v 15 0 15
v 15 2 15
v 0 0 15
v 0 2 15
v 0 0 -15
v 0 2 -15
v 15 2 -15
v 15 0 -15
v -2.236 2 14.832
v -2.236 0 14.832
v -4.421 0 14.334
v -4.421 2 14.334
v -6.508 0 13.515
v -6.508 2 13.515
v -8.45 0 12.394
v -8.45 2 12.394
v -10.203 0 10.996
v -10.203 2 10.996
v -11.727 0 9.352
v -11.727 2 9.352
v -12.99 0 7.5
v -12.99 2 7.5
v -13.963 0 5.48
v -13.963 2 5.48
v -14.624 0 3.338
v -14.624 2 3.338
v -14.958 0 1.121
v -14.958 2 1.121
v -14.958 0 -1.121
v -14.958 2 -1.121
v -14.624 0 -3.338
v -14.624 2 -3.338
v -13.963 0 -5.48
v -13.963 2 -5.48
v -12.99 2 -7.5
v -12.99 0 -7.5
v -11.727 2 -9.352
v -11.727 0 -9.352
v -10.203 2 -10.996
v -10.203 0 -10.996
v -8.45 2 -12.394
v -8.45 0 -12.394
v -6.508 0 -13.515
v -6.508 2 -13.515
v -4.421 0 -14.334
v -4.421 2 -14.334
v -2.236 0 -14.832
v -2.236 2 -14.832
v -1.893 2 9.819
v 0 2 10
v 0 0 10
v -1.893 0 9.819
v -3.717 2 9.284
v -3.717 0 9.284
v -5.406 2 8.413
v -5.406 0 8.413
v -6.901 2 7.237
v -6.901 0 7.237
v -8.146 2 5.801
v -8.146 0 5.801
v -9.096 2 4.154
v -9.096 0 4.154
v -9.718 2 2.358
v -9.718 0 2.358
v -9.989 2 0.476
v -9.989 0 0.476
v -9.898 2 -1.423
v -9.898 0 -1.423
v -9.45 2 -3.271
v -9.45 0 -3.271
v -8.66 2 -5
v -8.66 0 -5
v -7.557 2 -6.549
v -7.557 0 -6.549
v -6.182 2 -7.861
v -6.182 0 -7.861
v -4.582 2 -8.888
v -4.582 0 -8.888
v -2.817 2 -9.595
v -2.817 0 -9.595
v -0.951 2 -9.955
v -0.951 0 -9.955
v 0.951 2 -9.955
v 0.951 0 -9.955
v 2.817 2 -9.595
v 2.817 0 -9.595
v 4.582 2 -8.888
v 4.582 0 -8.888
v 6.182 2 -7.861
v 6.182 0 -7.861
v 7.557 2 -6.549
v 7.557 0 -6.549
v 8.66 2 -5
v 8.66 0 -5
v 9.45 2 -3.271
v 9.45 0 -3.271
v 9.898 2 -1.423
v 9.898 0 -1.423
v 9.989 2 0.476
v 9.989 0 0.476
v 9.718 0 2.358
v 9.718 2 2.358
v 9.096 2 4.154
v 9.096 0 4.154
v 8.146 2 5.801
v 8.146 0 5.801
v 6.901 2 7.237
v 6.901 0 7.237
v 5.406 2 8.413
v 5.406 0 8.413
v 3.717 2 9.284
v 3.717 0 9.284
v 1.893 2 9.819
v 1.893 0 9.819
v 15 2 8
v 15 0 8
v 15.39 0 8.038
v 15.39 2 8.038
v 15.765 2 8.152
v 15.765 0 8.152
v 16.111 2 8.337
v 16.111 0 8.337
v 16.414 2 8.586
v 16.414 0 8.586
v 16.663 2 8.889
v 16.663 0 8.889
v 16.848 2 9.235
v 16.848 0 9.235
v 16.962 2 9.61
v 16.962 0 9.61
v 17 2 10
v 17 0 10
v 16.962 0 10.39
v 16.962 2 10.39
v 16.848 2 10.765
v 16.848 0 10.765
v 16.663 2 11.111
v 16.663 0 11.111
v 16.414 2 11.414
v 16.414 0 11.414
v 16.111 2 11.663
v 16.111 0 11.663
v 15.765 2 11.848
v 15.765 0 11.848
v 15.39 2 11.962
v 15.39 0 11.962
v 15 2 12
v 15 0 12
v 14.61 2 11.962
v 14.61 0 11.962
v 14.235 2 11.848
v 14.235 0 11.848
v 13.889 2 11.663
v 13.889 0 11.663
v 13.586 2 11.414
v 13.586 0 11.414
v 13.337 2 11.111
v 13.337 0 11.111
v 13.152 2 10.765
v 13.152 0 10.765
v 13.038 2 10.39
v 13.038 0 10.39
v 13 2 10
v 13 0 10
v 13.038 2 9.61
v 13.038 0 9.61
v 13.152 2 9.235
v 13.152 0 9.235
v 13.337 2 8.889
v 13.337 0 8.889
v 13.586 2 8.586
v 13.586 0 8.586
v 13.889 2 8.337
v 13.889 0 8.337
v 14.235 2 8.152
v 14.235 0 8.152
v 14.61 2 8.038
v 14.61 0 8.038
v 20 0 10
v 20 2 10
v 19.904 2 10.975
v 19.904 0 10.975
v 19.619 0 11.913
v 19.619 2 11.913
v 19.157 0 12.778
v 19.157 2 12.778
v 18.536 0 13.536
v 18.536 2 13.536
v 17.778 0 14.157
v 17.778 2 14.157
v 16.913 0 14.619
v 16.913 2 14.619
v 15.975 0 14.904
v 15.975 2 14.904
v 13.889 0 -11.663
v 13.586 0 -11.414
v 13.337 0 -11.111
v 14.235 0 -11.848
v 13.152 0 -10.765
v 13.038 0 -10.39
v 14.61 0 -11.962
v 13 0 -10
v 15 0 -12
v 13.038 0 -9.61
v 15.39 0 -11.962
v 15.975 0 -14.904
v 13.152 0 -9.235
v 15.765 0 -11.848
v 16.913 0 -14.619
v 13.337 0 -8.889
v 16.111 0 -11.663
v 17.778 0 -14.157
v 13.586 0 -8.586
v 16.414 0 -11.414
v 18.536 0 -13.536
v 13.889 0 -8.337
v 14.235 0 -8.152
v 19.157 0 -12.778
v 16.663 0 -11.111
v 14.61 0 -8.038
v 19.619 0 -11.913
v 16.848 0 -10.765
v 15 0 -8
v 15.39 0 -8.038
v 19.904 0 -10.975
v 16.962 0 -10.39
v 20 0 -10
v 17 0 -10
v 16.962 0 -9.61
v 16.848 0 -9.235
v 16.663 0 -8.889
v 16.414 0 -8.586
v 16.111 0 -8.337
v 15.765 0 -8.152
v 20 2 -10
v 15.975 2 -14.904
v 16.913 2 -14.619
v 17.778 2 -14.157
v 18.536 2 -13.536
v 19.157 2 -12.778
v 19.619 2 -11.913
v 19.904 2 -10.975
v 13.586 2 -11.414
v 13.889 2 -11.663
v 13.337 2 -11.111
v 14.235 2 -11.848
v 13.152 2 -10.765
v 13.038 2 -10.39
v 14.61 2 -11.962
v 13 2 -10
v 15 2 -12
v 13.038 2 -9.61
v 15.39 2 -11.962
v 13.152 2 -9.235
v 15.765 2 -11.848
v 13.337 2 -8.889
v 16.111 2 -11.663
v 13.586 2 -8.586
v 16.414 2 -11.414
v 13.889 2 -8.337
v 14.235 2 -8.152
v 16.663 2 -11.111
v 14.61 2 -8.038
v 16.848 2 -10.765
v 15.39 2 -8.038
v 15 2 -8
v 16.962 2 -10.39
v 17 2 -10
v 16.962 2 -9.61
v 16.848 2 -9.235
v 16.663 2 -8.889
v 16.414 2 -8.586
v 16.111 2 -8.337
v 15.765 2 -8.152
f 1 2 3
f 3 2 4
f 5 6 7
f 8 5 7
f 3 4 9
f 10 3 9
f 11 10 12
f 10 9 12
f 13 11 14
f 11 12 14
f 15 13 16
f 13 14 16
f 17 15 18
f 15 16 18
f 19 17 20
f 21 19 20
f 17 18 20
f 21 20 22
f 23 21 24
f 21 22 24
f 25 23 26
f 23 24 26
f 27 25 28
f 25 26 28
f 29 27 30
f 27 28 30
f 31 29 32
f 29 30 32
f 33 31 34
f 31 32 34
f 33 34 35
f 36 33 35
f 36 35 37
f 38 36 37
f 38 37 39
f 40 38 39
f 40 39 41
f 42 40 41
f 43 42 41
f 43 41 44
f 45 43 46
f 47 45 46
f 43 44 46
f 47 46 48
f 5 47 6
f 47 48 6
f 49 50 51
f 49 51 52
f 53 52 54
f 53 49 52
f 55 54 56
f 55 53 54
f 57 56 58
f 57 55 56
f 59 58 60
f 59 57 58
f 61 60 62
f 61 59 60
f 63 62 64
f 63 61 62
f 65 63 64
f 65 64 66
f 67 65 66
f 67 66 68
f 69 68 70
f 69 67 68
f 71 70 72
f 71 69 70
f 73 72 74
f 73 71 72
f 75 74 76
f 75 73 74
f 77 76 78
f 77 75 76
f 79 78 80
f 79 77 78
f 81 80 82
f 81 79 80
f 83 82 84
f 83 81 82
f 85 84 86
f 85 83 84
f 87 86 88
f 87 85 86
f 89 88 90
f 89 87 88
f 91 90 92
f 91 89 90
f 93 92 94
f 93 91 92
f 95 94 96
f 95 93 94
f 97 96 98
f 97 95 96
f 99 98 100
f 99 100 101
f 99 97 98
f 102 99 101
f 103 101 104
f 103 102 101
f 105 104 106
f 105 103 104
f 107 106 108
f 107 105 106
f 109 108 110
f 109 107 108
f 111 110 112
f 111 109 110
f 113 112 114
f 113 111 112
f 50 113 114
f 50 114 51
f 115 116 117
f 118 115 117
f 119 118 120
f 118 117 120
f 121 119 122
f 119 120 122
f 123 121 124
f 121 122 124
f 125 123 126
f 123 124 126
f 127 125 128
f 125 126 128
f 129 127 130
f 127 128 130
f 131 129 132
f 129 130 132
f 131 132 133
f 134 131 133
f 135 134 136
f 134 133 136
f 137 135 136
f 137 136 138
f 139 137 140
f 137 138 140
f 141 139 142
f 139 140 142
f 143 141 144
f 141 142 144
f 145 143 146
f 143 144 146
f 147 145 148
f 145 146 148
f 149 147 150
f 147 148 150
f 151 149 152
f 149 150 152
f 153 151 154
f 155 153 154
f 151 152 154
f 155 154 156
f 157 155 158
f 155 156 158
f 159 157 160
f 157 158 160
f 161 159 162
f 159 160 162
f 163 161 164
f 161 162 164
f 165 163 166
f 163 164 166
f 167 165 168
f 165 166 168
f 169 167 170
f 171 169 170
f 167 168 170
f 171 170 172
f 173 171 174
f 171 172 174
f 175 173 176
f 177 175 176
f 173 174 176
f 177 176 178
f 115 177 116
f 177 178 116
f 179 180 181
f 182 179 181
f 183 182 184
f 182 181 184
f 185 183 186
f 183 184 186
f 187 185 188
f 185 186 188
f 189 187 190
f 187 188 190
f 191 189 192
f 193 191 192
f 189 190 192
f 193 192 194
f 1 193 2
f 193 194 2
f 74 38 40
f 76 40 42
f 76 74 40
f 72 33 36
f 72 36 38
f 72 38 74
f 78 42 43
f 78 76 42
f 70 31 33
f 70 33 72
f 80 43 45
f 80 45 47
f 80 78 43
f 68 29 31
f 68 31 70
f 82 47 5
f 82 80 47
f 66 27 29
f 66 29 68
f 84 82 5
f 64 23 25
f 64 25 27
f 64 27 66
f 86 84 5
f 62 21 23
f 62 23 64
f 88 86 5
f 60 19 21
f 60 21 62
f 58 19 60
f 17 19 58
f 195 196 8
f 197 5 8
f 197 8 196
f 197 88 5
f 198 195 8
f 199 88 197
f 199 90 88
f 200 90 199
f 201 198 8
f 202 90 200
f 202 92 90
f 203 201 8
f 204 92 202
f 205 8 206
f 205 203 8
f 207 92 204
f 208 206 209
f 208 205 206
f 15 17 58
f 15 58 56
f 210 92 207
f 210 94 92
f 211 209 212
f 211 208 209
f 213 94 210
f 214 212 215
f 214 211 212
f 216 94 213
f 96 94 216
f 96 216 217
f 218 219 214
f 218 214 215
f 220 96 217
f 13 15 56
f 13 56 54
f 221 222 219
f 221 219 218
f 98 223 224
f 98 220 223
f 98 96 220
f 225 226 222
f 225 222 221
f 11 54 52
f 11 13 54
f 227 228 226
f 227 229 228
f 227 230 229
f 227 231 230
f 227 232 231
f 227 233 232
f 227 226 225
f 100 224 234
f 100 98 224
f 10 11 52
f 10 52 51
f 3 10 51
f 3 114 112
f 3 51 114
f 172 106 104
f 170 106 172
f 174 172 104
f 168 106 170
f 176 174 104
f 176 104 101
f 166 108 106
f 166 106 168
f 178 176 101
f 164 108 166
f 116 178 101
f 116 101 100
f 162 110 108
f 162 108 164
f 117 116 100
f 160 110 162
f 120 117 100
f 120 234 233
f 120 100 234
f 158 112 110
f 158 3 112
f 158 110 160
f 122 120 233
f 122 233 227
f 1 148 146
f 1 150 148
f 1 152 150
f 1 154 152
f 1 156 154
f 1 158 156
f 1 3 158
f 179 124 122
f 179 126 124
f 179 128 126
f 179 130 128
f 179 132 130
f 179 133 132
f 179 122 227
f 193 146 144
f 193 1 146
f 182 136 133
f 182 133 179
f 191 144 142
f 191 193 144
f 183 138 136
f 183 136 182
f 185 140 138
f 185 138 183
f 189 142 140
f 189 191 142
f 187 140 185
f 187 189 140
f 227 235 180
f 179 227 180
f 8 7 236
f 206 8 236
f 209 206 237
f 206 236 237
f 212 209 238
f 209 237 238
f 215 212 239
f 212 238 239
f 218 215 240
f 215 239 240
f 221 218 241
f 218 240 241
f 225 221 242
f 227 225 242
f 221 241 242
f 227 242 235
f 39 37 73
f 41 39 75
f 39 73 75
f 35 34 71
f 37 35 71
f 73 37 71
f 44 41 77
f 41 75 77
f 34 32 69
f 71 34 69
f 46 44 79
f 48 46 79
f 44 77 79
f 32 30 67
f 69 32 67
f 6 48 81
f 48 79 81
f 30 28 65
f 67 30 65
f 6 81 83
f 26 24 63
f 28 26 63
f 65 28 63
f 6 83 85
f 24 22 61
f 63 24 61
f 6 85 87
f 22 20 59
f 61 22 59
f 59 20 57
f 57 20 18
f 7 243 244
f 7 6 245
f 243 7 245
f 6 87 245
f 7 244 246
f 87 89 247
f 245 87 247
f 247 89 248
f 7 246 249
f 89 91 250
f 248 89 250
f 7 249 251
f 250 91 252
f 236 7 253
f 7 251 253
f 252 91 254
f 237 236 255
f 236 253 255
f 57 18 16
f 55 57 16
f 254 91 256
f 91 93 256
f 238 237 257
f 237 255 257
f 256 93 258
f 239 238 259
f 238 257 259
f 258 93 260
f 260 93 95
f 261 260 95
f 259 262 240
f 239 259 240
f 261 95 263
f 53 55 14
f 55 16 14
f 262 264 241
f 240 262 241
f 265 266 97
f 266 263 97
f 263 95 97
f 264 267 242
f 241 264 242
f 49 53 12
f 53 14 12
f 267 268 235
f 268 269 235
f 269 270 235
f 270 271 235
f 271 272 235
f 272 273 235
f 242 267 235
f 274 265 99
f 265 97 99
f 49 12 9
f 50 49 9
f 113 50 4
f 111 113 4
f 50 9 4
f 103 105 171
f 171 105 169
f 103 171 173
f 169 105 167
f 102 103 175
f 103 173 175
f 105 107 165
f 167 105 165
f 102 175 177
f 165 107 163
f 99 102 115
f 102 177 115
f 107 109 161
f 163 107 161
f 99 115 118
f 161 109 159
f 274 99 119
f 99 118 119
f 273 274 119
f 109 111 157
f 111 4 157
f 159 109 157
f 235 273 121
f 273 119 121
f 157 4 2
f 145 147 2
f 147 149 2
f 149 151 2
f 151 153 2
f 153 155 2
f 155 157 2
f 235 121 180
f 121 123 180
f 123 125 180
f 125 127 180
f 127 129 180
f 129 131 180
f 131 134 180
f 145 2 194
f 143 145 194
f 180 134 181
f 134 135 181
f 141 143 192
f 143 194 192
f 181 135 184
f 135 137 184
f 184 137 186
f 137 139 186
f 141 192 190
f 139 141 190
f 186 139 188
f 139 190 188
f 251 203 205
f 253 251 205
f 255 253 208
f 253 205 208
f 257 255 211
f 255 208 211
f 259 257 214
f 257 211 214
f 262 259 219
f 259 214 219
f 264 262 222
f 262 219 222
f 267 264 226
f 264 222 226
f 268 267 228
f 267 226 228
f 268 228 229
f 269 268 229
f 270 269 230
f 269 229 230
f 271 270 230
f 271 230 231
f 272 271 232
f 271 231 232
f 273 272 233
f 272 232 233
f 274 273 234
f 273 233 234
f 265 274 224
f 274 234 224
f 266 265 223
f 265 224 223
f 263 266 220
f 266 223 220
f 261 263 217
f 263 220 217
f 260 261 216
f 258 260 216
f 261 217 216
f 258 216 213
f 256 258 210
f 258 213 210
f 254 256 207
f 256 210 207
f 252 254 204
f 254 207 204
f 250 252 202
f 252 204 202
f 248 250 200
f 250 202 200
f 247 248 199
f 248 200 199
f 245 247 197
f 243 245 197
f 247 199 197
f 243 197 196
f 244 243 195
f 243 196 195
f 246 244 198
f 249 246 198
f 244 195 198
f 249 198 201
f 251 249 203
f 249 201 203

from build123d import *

# Parameters (mm, degrees)
BOSS_EXTRUDE1_START = -2
BOSS_EXTRUDE1_DEPTH = 2
SKETCH4_R           = 2
CUT_EXTRUDE1_DEPTH  = 2
SKETCH6_R           = 11
CUT_EXTRUDE2_DEPTH  = 1


with BuildPart() as part:
    # Sketch2 → Revolve1 (revolve)
    with BuildSketch(Plane.XY, mode=Mode.PRIVATE) as revolve1_sk:
        Polygon((-10, 3), (-10, 2), (-10, 0), (-15, 0), (-15, 2), (-11, 2), (-11, 3), align=None)
    revolve(revolve1_sk.sketch.rotate(Axis((0, 45.867309825, 0), (0, -1, 0)), 270), axis=Axis((0, 45.867309825, 0), (0, -1, 0)))

    # Sketch3 → Boss-Extrude1 (add)
    with BuildSketch(Plane.XZ.offset(BOSS_EXTRUDE1_START)):
        with BuildLine():
            Line((0, -15), (15, -15))
            ThreePointArc((15, -15), (18.535533906, -13.535533906), (20, -10))
            Line((20, -10), (20, 10))
            ThreePointArc((20, 10), (18.535533906, 13.535533906), (15, 15))
            Line((15, 15), (0, 15))
            ThreePointArc((0, 15), (15, 0), (0, -15))
        make_face()
    extrude(amount=BOSS_EXTRUDE1_DEPTH)

    # Sketch4 → Cut-Extrude1 (cut)
    with BuildSketch(Plane.XZ):
        with Locations(Location((15, 10, 0), (0, 0, 270))):
            Circle(SKETCH4_R)
        with Locations(Location((15, -10, 0), (0, 0, 270))):
            Circle(SKETCH4_R)
    extrude(amount=-CUT_EXTRUDE1_DEPTH, mode=Mode.SUBTRACT)

    # Sketch6 → Cut-Extrude2 (cut)
    with BuildSketch(Plane(origin=(0, 3, 0), x_dir=(1, 0, 0), z_dir=(0, 1, 0))):
        Circle(SKETCH6_R)
    extrude(amount=-CUT_EXTRUDE2_DEPTH, mode=Mode.SUBTRACT)


solid = part.part
